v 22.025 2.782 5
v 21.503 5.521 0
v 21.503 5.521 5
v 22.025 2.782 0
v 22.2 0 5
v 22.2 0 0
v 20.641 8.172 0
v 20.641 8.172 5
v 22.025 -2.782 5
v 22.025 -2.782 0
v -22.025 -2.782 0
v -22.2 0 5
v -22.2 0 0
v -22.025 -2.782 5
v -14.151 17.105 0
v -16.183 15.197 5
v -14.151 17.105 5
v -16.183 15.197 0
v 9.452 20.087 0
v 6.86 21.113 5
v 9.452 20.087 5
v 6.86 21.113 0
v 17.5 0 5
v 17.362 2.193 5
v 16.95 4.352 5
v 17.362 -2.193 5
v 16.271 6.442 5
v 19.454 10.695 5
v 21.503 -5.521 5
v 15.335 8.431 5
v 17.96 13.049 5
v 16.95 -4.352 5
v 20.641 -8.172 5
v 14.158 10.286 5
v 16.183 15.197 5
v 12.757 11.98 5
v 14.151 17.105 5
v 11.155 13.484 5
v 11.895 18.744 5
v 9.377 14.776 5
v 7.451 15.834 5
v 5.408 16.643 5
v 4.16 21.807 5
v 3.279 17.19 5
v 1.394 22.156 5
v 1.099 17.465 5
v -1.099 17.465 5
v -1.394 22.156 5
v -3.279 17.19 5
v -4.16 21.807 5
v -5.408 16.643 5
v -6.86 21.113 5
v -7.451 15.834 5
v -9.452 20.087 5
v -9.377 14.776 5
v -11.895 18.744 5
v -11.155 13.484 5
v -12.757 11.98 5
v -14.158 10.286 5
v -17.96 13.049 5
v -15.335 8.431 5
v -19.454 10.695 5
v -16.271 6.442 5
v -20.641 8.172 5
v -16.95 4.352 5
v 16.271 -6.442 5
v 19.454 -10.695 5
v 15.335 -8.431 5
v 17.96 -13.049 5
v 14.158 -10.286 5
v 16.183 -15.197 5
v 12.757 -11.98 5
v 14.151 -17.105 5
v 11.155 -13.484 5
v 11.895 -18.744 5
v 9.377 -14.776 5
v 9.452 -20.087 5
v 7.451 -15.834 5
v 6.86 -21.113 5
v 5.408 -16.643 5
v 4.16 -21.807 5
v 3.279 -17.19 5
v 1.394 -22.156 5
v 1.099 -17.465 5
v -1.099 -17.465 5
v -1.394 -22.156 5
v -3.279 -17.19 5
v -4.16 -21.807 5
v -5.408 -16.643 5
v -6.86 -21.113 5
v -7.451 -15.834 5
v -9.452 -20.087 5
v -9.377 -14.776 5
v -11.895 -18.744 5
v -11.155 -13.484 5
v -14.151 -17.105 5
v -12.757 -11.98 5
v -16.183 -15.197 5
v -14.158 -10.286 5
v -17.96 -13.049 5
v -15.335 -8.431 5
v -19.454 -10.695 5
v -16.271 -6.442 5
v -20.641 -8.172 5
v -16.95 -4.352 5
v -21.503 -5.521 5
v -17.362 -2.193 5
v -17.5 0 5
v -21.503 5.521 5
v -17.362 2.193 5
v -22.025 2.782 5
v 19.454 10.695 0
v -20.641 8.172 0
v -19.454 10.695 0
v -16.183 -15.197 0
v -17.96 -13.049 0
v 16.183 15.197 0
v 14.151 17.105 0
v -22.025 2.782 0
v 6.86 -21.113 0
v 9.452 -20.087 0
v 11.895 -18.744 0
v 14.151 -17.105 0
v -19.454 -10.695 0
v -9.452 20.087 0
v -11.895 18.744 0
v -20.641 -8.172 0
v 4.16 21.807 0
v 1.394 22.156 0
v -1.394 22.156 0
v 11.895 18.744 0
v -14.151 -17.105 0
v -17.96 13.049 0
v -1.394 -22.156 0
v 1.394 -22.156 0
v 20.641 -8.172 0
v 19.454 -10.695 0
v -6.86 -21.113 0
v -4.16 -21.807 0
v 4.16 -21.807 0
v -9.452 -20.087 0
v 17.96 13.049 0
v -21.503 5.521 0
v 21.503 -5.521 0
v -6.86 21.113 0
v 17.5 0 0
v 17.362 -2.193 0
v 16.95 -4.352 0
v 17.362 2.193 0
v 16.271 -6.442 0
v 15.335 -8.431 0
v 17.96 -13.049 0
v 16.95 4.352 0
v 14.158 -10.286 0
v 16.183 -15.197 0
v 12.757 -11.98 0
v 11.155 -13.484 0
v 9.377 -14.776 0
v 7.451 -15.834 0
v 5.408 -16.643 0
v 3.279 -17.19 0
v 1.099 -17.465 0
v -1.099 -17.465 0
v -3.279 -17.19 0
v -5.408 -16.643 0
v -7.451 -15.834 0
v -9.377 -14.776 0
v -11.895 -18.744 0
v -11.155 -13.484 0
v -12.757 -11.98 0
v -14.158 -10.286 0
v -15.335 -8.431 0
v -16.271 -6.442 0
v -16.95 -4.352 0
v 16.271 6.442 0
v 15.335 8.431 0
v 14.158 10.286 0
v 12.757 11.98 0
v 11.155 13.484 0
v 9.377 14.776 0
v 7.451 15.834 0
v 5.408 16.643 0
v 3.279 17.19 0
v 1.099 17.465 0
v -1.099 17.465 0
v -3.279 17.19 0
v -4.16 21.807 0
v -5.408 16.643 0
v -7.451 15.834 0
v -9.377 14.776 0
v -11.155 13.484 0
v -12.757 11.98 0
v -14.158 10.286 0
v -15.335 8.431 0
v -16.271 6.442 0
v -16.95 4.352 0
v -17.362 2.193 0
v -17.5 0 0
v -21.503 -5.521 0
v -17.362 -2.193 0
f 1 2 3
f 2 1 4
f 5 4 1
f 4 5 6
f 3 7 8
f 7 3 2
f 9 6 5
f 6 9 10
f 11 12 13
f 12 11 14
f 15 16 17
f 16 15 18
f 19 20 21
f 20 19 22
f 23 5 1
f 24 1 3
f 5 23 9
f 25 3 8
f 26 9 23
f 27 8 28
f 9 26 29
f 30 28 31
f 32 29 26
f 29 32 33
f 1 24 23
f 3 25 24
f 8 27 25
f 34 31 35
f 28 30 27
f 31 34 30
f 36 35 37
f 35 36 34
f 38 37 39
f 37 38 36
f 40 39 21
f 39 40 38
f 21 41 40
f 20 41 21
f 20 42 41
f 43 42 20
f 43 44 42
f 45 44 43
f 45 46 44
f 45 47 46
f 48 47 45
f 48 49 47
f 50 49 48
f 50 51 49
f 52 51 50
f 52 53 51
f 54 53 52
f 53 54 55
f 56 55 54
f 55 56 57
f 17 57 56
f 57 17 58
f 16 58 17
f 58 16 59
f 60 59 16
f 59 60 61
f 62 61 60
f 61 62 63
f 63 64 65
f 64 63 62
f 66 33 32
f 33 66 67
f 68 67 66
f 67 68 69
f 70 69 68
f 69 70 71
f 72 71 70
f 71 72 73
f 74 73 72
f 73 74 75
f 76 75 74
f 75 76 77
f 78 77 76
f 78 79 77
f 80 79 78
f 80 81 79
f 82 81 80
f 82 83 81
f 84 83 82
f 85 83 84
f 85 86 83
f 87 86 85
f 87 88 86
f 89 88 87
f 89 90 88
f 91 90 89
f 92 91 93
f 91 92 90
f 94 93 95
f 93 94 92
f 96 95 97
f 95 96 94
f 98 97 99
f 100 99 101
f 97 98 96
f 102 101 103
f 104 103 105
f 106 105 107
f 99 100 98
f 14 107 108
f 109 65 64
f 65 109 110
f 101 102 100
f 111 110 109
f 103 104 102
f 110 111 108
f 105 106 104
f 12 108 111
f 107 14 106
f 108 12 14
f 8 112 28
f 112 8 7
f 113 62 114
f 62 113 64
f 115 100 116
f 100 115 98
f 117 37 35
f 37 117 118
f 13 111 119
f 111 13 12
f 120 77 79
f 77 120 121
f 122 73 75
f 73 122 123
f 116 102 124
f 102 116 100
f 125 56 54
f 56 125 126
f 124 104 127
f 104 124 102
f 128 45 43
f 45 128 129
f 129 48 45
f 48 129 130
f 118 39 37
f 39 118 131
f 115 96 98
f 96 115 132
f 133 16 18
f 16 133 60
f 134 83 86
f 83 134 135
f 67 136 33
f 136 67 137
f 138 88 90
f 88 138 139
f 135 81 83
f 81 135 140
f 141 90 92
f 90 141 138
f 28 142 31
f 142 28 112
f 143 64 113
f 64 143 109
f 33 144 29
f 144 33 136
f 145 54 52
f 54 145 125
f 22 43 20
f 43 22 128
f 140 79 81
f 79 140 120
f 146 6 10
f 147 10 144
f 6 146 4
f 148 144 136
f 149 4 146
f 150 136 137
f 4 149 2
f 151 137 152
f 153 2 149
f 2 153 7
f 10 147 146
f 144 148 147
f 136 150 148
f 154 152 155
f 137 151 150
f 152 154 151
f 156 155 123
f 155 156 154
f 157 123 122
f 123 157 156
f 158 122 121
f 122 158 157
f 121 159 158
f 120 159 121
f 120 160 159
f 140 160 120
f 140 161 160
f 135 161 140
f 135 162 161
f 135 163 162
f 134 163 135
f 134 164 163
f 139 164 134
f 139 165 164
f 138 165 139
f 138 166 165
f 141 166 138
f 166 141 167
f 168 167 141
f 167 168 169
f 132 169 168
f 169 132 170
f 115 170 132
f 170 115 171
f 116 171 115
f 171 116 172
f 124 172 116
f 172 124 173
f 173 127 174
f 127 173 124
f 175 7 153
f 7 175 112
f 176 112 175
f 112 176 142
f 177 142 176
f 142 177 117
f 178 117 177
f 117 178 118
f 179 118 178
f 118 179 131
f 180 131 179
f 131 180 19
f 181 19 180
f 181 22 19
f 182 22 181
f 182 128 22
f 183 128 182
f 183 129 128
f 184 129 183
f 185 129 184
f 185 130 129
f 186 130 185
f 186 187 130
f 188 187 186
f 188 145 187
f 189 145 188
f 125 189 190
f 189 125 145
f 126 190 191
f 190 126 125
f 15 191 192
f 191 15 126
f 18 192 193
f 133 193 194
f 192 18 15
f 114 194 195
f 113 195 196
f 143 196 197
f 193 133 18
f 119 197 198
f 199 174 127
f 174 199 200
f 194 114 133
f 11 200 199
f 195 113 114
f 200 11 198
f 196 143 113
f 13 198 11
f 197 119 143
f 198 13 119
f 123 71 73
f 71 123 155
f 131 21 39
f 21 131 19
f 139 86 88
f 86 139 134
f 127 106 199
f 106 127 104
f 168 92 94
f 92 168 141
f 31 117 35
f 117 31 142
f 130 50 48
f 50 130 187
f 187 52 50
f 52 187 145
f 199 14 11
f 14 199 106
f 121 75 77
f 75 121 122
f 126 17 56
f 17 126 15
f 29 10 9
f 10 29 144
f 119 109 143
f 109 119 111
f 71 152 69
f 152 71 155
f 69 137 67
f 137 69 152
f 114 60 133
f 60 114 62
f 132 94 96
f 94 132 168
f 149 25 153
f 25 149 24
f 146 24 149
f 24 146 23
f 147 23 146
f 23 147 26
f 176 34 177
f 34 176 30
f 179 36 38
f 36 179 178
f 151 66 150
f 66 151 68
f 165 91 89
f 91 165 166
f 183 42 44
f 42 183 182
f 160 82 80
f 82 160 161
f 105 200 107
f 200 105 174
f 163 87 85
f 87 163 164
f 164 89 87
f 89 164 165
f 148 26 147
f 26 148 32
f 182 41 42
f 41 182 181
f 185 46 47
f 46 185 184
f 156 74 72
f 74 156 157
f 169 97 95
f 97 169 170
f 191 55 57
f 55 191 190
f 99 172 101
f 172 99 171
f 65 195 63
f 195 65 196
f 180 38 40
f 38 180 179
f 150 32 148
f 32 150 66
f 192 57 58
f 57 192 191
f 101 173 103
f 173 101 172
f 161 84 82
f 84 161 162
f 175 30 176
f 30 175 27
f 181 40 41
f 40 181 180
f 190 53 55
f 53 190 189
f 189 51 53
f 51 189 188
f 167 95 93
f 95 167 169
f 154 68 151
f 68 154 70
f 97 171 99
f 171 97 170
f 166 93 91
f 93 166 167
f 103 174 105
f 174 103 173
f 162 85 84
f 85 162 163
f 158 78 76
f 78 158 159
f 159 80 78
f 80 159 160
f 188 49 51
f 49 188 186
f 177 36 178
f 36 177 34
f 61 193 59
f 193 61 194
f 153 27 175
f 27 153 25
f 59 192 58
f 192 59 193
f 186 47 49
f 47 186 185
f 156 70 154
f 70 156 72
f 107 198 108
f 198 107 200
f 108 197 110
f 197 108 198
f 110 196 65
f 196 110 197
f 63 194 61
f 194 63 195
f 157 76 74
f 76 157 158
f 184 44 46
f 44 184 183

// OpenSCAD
$fn = 50;


difference() {
	union() {
		cylinder(h = 5, r = 22.2000000000);
	}
	union() {
		cylinder(h = 5, r = 17.5000000000);
	}
}
